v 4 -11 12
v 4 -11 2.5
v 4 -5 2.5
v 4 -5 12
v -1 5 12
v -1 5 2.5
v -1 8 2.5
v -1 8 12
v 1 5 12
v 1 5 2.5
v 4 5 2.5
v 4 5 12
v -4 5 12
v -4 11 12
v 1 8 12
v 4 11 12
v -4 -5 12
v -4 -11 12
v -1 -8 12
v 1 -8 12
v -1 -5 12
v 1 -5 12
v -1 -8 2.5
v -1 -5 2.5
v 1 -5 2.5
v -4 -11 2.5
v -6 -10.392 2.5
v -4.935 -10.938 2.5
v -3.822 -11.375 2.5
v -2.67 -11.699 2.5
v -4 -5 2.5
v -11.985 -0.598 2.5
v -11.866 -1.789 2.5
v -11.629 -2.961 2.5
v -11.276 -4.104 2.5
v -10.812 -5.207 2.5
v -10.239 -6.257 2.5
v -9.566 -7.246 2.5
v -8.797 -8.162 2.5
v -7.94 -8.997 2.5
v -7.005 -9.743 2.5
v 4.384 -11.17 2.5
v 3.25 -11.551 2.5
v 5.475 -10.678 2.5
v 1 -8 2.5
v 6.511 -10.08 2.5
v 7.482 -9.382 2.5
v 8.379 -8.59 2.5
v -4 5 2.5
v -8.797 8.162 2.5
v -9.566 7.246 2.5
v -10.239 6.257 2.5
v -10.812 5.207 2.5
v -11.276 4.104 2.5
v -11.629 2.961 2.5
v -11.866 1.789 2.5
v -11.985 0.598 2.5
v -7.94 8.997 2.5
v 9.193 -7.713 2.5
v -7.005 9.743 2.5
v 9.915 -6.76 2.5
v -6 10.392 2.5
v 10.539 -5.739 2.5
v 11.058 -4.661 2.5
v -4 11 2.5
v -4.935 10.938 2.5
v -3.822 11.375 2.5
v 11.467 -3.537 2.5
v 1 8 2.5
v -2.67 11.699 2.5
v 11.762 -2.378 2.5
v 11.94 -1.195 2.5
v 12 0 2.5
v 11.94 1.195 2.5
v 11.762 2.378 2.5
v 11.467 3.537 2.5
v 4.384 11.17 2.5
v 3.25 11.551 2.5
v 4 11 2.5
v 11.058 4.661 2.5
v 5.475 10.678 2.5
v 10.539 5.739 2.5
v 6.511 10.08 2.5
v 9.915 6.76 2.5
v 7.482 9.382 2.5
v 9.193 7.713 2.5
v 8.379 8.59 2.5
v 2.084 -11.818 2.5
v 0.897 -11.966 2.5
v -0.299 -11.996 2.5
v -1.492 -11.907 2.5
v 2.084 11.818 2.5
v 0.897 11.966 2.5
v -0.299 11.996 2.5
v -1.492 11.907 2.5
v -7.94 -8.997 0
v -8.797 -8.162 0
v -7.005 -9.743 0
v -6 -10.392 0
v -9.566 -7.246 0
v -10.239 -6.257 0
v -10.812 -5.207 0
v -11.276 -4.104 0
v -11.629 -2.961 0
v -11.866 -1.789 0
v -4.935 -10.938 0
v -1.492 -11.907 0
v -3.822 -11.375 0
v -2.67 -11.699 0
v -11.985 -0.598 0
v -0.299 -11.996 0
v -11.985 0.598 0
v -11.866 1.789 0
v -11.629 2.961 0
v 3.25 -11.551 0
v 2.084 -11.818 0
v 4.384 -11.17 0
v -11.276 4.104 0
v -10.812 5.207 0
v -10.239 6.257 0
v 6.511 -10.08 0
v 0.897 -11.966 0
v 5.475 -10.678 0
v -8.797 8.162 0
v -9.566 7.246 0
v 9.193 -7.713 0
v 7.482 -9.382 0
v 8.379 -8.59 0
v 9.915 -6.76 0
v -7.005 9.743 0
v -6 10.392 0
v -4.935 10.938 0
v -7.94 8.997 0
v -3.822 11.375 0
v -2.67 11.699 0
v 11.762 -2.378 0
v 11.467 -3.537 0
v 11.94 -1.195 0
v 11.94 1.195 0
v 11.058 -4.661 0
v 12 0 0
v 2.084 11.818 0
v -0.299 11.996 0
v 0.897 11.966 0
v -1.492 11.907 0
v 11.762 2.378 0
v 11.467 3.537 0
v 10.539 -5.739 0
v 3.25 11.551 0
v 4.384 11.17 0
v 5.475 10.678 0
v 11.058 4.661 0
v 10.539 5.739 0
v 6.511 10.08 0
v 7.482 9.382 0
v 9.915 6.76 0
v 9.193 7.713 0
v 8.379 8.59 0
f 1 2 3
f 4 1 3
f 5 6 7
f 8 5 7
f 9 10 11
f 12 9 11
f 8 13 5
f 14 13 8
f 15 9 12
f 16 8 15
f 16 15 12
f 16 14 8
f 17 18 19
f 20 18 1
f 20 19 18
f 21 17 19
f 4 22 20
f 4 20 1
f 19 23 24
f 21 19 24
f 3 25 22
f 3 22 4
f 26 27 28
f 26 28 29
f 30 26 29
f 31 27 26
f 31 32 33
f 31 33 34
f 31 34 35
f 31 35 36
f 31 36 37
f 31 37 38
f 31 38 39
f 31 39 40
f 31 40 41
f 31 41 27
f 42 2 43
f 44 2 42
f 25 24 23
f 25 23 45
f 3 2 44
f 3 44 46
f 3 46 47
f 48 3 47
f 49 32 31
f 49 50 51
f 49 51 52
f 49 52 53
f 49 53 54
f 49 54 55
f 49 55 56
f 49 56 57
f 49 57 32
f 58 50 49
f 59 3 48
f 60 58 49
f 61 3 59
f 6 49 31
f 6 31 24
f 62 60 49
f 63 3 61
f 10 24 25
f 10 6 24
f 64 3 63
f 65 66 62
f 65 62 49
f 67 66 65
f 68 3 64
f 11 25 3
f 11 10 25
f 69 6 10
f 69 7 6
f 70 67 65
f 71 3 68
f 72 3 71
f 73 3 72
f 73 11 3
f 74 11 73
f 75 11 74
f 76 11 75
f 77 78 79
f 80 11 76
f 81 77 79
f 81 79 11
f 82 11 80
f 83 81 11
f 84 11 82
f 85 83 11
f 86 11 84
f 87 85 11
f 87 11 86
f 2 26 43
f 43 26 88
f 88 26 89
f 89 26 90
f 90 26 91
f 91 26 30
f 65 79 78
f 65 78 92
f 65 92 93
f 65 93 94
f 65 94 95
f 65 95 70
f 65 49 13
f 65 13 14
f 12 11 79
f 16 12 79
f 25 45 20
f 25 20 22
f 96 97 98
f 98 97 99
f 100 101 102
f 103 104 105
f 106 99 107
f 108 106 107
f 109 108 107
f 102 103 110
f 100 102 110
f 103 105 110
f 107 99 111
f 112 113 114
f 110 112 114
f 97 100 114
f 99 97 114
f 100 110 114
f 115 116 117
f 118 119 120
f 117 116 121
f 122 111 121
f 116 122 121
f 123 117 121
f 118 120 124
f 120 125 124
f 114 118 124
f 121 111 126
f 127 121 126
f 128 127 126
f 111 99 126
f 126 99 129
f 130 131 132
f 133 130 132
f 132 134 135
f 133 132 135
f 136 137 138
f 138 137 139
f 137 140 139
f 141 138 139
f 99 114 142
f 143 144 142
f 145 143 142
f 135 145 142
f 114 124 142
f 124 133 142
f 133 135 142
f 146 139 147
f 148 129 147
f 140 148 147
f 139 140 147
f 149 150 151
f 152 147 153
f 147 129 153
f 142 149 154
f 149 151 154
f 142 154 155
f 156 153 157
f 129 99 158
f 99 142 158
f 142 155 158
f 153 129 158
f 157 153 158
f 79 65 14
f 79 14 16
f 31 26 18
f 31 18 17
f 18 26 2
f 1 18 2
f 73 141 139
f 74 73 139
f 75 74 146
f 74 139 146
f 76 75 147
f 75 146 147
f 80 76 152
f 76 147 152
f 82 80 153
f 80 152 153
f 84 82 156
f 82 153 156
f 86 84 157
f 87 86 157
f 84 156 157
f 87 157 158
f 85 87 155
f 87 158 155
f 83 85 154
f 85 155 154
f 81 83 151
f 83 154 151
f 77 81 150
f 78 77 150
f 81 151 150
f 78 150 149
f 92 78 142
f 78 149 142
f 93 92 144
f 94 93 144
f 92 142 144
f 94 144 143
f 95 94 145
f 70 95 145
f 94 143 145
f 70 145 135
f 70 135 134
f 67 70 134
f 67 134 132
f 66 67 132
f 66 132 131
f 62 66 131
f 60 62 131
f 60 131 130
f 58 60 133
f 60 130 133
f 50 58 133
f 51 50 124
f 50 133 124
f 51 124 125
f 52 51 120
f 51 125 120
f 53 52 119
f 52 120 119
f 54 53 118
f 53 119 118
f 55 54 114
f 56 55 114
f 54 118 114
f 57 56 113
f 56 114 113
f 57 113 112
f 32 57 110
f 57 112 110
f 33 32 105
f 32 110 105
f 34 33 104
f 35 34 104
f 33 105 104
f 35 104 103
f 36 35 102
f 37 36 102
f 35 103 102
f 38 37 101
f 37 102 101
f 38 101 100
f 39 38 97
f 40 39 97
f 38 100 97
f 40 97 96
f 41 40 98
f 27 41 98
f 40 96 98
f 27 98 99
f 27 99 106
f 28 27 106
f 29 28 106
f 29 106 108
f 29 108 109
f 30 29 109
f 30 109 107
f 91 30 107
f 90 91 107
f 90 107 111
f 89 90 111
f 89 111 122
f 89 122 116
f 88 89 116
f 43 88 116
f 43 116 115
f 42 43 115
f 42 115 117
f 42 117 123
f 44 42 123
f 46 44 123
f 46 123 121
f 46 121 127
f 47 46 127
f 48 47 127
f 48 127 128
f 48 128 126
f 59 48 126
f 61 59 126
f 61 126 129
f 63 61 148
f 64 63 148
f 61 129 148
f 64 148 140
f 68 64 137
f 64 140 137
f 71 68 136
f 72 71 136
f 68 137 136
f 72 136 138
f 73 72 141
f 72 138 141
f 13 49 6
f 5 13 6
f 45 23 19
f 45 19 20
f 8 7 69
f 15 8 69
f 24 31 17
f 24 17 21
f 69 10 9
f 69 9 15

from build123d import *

# Parameters (mm, degrees)
CYLINDER_R     = 12
CYLINDER_DEPTH = 2.5
BOX002_W       = 10
BOX002_H       = 10
BOX002_DEPTH   = 10
BOX001_W       = 2
BOX001_H       = 16
BOX001_DEPTH   = 10
BOX_W          = 8
BOX_H          = 22
BOX_DEPTH      = 10


with BuildPart() as cylinder:
    # Cylinder → Cylinder (new body)
    with BuildSketch(Plane.XY):
        Circle(CYLINDER_R)
    extrude(amount=CYLINDER_DEPTH)


with BuildPart() as cube002:
    # Box002 → Box002 (new body)
    with BuildSketch(Plane(origin=(-5, -5, 2), x_dir=(1, 0, 0), z_dir=(0, 0, 1))):
        with Locations((5, 5)):
            Rectangle(BOX002_W, BOX002_H)
    extrude(amount=BOX002_DEPTH)


with BuildPart() as fusion:
    # Box001 → Box001 (new body)
    with BuildSketch(Plane(origin=(-1, -8, 2), x_dir=(1, 0, 0), z_dir=(0, 0, 1))):
        with Locations((1, 8)):
            Rectangle(BOX001_W, BOX001_H)
    extrude(amount=BOX001_DEPTH)

    # Fusion: union Cube002
    add(cube002.part)


with BuildPart() as fusion001:
    # Box → Box (new body)
    with BuildSketch(Plane(origin=(-4, -11, 2), x_dir=(1, 0, 0), z_dir=(0, 0, 1))):
        with Locations((4, 11)):
            Rectangle(BOX_W, BOX_H)
    extrude(amount=BOX_DEPTH)

    # Cut: cut Fusion
    add(fusion.part, mode=Mode.SUBTRACT)

    # Fusion001: union Cylinder
    add(cylinder.part)


solid = fusion001.part
